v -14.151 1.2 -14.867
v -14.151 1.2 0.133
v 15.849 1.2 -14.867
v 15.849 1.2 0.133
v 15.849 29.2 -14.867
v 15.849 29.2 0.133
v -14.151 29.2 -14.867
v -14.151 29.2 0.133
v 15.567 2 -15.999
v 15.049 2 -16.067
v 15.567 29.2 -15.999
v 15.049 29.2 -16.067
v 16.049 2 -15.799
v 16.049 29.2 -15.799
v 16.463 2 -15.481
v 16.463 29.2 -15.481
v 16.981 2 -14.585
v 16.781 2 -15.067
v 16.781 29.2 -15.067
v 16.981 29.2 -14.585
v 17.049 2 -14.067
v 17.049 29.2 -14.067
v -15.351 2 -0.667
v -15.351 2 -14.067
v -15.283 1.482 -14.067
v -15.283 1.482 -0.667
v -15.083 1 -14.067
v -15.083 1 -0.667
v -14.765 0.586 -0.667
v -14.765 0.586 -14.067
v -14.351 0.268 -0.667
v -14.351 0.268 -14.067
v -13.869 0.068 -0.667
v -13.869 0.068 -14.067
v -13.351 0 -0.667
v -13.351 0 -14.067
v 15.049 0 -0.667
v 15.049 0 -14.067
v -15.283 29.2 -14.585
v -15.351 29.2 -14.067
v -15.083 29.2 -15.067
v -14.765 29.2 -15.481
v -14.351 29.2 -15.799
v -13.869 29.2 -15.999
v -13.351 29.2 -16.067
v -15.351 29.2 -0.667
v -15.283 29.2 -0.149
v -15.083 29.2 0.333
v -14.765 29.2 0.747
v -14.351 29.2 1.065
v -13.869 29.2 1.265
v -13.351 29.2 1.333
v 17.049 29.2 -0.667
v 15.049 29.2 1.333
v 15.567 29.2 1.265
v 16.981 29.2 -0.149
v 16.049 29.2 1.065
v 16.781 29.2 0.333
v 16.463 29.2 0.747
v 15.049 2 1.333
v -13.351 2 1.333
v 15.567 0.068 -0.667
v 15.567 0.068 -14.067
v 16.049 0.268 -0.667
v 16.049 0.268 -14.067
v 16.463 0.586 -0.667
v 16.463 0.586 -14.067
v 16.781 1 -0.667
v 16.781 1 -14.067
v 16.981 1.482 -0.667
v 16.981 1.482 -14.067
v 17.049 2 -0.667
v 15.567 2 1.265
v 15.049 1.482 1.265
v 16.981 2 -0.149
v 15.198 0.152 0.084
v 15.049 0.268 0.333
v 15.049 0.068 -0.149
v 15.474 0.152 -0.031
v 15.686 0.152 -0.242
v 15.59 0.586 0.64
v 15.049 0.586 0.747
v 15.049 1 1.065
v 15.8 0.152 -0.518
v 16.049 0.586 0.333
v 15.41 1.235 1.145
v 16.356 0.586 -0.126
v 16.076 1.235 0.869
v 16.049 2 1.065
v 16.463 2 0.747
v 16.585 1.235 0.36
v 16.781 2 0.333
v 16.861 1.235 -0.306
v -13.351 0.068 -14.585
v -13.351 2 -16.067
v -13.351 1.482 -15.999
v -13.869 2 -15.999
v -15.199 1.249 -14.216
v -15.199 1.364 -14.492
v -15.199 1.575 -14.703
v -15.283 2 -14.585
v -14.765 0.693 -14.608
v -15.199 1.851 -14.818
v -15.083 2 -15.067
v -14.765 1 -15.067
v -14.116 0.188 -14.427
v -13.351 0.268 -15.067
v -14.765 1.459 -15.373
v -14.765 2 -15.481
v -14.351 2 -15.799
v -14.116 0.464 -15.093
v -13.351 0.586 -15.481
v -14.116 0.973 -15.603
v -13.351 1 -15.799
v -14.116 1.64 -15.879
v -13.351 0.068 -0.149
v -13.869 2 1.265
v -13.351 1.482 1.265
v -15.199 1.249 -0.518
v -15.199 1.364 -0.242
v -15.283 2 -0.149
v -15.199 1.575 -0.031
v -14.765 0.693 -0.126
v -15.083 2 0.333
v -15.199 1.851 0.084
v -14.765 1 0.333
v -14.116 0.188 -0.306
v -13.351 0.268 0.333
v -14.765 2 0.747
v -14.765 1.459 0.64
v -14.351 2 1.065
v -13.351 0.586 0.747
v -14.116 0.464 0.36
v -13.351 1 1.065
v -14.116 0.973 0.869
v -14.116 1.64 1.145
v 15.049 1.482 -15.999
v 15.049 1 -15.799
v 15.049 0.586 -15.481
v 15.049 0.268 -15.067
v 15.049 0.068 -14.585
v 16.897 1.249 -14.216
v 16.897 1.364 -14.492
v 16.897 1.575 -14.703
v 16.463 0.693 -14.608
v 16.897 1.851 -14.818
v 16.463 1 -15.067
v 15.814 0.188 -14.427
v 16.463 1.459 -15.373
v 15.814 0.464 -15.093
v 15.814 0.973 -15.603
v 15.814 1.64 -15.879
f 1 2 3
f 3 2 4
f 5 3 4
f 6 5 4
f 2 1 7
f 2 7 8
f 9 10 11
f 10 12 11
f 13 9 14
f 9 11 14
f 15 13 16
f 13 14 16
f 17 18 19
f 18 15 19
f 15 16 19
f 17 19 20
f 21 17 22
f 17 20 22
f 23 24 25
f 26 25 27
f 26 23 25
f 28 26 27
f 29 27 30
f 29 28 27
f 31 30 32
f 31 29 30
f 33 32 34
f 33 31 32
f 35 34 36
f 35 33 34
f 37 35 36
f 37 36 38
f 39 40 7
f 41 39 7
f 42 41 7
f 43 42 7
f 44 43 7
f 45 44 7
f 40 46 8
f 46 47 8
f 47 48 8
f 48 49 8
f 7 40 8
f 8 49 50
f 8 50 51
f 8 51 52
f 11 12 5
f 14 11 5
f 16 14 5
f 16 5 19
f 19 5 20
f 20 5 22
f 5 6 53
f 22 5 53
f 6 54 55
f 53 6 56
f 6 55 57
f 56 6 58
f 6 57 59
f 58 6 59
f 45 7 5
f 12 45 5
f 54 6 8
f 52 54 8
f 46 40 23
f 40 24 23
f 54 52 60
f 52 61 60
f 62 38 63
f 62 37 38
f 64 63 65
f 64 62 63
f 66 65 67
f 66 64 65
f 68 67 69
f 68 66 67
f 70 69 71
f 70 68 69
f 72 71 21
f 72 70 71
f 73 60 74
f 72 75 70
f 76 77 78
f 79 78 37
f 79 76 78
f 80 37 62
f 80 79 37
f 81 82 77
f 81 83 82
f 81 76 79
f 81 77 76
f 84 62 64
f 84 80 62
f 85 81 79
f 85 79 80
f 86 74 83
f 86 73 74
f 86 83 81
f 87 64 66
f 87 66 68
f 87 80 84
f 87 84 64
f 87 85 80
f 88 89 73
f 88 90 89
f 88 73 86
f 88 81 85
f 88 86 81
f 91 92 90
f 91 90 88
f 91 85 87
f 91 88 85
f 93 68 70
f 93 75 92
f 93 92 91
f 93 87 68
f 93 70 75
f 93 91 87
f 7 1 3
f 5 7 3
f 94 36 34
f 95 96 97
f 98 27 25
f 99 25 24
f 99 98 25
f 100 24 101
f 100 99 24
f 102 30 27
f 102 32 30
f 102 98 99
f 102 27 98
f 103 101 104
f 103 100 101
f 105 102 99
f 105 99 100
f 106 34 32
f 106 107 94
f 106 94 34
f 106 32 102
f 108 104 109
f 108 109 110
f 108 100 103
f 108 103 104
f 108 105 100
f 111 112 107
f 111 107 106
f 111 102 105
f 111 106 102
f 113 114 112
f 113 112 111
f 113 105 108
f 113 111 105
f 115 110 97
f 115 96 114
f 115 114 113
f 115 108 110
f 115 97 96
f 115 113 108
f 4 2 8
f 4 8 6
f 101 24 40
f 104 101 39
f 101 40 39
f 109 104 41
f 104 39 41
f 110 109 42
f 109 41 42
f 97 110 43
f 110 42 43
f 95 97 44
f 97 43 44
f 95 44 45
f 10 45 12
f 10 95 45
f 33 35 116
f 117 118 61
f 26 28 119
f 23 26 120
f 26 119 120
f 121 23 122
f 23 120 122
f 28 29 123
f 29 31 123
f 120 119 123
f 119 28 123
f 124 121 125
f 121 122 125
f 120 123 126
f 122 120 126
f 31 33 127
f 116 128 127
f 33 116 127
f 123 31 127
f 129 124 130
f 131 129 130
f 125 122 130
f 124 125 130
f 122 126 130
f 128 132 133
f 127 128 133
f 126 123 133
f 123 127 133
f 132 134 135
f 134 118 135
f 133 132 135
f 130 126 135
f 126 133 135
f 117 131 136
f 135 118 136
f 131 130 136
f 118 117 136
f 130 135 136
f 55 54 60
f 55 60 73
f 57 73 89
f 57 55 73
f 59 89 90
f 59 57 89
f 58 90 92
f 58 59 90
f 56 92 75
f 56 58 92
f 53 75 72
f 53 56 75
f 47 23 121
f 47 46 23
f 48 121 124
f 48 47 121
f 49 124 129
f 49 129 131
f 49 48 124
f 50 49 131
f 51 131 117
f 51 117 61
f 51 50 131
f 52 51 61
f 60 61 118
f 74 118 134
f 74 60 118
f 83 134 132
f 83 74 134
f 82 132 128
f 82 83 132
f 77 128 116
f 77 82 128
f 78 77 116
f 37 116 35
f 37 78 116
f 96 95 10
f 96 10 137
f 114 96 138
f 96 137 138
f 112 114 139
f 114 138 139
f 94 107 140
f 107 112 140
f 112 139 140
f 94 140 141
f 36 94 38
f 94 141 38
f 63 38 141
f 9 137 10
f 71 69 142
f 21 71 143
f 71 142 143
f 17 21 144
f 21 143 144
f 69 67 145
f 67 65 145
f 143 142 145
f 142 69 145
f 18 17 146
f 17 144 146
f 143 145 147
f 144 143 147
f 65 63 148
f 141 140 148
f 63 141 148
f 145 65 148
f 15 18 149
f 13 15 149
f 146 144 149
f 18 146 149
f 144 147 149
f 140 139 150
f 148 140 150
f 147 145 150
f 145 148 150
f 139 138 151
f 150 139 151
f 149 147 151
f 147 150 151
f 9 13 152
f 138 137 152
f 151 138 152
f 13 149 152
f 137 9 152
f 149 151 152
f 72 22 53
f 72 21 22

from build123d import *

# Parameters (mm, degrees)
F0_W     = 30
F0_H     = 15
F1_DEPTH = 1.2
F0_W_2   = 32.4
F0_H_2   = 17.4
F2_DEPTH = 29.2
F3_R     = 2


with BuildPart() as f1:
    # F0 (on Front) → F1 (new body)
    with BuildSketch(Plane.XZ):
        with Locations((0.849122, -7.366886)):
            Rectangle(F0_W, F0_H)
    extrude(amount=-F1_DEPTH)

    # F0 (on Front) → F2 (join)
    with BuildSketch(Plane.XZ):
        with Locations((0.849122, -7.366886)):
            Rectangle(F0_W_2, F0_H_2)
        with Locations((0.849122, -7.366886)):
            Rectangle(F0_W, F0_H, mode=Mode.SUBTRACT)
    extrude(amount=-F2_DEPTH)

    # F3
    f3_edges = [f1.edges().sort_by_distance(p)[0] for p in [
        (17.049122, 14.6, 1.333114),
        (0.849122, 0, 1.333114),
        (0.849122, 0, -16.066886),
        (17.049122, 0, -7.366886),
        (17.049122, 14.6, -16.066886),
        (-15.350878, 0, -7.366886),
        (-15.350878, 14.6, 1.333114),
        (-15.350878, 14.6, -16.066886),
    ]]
    fillet(f3_edges, radius=F3_R)


solid = f1.part
